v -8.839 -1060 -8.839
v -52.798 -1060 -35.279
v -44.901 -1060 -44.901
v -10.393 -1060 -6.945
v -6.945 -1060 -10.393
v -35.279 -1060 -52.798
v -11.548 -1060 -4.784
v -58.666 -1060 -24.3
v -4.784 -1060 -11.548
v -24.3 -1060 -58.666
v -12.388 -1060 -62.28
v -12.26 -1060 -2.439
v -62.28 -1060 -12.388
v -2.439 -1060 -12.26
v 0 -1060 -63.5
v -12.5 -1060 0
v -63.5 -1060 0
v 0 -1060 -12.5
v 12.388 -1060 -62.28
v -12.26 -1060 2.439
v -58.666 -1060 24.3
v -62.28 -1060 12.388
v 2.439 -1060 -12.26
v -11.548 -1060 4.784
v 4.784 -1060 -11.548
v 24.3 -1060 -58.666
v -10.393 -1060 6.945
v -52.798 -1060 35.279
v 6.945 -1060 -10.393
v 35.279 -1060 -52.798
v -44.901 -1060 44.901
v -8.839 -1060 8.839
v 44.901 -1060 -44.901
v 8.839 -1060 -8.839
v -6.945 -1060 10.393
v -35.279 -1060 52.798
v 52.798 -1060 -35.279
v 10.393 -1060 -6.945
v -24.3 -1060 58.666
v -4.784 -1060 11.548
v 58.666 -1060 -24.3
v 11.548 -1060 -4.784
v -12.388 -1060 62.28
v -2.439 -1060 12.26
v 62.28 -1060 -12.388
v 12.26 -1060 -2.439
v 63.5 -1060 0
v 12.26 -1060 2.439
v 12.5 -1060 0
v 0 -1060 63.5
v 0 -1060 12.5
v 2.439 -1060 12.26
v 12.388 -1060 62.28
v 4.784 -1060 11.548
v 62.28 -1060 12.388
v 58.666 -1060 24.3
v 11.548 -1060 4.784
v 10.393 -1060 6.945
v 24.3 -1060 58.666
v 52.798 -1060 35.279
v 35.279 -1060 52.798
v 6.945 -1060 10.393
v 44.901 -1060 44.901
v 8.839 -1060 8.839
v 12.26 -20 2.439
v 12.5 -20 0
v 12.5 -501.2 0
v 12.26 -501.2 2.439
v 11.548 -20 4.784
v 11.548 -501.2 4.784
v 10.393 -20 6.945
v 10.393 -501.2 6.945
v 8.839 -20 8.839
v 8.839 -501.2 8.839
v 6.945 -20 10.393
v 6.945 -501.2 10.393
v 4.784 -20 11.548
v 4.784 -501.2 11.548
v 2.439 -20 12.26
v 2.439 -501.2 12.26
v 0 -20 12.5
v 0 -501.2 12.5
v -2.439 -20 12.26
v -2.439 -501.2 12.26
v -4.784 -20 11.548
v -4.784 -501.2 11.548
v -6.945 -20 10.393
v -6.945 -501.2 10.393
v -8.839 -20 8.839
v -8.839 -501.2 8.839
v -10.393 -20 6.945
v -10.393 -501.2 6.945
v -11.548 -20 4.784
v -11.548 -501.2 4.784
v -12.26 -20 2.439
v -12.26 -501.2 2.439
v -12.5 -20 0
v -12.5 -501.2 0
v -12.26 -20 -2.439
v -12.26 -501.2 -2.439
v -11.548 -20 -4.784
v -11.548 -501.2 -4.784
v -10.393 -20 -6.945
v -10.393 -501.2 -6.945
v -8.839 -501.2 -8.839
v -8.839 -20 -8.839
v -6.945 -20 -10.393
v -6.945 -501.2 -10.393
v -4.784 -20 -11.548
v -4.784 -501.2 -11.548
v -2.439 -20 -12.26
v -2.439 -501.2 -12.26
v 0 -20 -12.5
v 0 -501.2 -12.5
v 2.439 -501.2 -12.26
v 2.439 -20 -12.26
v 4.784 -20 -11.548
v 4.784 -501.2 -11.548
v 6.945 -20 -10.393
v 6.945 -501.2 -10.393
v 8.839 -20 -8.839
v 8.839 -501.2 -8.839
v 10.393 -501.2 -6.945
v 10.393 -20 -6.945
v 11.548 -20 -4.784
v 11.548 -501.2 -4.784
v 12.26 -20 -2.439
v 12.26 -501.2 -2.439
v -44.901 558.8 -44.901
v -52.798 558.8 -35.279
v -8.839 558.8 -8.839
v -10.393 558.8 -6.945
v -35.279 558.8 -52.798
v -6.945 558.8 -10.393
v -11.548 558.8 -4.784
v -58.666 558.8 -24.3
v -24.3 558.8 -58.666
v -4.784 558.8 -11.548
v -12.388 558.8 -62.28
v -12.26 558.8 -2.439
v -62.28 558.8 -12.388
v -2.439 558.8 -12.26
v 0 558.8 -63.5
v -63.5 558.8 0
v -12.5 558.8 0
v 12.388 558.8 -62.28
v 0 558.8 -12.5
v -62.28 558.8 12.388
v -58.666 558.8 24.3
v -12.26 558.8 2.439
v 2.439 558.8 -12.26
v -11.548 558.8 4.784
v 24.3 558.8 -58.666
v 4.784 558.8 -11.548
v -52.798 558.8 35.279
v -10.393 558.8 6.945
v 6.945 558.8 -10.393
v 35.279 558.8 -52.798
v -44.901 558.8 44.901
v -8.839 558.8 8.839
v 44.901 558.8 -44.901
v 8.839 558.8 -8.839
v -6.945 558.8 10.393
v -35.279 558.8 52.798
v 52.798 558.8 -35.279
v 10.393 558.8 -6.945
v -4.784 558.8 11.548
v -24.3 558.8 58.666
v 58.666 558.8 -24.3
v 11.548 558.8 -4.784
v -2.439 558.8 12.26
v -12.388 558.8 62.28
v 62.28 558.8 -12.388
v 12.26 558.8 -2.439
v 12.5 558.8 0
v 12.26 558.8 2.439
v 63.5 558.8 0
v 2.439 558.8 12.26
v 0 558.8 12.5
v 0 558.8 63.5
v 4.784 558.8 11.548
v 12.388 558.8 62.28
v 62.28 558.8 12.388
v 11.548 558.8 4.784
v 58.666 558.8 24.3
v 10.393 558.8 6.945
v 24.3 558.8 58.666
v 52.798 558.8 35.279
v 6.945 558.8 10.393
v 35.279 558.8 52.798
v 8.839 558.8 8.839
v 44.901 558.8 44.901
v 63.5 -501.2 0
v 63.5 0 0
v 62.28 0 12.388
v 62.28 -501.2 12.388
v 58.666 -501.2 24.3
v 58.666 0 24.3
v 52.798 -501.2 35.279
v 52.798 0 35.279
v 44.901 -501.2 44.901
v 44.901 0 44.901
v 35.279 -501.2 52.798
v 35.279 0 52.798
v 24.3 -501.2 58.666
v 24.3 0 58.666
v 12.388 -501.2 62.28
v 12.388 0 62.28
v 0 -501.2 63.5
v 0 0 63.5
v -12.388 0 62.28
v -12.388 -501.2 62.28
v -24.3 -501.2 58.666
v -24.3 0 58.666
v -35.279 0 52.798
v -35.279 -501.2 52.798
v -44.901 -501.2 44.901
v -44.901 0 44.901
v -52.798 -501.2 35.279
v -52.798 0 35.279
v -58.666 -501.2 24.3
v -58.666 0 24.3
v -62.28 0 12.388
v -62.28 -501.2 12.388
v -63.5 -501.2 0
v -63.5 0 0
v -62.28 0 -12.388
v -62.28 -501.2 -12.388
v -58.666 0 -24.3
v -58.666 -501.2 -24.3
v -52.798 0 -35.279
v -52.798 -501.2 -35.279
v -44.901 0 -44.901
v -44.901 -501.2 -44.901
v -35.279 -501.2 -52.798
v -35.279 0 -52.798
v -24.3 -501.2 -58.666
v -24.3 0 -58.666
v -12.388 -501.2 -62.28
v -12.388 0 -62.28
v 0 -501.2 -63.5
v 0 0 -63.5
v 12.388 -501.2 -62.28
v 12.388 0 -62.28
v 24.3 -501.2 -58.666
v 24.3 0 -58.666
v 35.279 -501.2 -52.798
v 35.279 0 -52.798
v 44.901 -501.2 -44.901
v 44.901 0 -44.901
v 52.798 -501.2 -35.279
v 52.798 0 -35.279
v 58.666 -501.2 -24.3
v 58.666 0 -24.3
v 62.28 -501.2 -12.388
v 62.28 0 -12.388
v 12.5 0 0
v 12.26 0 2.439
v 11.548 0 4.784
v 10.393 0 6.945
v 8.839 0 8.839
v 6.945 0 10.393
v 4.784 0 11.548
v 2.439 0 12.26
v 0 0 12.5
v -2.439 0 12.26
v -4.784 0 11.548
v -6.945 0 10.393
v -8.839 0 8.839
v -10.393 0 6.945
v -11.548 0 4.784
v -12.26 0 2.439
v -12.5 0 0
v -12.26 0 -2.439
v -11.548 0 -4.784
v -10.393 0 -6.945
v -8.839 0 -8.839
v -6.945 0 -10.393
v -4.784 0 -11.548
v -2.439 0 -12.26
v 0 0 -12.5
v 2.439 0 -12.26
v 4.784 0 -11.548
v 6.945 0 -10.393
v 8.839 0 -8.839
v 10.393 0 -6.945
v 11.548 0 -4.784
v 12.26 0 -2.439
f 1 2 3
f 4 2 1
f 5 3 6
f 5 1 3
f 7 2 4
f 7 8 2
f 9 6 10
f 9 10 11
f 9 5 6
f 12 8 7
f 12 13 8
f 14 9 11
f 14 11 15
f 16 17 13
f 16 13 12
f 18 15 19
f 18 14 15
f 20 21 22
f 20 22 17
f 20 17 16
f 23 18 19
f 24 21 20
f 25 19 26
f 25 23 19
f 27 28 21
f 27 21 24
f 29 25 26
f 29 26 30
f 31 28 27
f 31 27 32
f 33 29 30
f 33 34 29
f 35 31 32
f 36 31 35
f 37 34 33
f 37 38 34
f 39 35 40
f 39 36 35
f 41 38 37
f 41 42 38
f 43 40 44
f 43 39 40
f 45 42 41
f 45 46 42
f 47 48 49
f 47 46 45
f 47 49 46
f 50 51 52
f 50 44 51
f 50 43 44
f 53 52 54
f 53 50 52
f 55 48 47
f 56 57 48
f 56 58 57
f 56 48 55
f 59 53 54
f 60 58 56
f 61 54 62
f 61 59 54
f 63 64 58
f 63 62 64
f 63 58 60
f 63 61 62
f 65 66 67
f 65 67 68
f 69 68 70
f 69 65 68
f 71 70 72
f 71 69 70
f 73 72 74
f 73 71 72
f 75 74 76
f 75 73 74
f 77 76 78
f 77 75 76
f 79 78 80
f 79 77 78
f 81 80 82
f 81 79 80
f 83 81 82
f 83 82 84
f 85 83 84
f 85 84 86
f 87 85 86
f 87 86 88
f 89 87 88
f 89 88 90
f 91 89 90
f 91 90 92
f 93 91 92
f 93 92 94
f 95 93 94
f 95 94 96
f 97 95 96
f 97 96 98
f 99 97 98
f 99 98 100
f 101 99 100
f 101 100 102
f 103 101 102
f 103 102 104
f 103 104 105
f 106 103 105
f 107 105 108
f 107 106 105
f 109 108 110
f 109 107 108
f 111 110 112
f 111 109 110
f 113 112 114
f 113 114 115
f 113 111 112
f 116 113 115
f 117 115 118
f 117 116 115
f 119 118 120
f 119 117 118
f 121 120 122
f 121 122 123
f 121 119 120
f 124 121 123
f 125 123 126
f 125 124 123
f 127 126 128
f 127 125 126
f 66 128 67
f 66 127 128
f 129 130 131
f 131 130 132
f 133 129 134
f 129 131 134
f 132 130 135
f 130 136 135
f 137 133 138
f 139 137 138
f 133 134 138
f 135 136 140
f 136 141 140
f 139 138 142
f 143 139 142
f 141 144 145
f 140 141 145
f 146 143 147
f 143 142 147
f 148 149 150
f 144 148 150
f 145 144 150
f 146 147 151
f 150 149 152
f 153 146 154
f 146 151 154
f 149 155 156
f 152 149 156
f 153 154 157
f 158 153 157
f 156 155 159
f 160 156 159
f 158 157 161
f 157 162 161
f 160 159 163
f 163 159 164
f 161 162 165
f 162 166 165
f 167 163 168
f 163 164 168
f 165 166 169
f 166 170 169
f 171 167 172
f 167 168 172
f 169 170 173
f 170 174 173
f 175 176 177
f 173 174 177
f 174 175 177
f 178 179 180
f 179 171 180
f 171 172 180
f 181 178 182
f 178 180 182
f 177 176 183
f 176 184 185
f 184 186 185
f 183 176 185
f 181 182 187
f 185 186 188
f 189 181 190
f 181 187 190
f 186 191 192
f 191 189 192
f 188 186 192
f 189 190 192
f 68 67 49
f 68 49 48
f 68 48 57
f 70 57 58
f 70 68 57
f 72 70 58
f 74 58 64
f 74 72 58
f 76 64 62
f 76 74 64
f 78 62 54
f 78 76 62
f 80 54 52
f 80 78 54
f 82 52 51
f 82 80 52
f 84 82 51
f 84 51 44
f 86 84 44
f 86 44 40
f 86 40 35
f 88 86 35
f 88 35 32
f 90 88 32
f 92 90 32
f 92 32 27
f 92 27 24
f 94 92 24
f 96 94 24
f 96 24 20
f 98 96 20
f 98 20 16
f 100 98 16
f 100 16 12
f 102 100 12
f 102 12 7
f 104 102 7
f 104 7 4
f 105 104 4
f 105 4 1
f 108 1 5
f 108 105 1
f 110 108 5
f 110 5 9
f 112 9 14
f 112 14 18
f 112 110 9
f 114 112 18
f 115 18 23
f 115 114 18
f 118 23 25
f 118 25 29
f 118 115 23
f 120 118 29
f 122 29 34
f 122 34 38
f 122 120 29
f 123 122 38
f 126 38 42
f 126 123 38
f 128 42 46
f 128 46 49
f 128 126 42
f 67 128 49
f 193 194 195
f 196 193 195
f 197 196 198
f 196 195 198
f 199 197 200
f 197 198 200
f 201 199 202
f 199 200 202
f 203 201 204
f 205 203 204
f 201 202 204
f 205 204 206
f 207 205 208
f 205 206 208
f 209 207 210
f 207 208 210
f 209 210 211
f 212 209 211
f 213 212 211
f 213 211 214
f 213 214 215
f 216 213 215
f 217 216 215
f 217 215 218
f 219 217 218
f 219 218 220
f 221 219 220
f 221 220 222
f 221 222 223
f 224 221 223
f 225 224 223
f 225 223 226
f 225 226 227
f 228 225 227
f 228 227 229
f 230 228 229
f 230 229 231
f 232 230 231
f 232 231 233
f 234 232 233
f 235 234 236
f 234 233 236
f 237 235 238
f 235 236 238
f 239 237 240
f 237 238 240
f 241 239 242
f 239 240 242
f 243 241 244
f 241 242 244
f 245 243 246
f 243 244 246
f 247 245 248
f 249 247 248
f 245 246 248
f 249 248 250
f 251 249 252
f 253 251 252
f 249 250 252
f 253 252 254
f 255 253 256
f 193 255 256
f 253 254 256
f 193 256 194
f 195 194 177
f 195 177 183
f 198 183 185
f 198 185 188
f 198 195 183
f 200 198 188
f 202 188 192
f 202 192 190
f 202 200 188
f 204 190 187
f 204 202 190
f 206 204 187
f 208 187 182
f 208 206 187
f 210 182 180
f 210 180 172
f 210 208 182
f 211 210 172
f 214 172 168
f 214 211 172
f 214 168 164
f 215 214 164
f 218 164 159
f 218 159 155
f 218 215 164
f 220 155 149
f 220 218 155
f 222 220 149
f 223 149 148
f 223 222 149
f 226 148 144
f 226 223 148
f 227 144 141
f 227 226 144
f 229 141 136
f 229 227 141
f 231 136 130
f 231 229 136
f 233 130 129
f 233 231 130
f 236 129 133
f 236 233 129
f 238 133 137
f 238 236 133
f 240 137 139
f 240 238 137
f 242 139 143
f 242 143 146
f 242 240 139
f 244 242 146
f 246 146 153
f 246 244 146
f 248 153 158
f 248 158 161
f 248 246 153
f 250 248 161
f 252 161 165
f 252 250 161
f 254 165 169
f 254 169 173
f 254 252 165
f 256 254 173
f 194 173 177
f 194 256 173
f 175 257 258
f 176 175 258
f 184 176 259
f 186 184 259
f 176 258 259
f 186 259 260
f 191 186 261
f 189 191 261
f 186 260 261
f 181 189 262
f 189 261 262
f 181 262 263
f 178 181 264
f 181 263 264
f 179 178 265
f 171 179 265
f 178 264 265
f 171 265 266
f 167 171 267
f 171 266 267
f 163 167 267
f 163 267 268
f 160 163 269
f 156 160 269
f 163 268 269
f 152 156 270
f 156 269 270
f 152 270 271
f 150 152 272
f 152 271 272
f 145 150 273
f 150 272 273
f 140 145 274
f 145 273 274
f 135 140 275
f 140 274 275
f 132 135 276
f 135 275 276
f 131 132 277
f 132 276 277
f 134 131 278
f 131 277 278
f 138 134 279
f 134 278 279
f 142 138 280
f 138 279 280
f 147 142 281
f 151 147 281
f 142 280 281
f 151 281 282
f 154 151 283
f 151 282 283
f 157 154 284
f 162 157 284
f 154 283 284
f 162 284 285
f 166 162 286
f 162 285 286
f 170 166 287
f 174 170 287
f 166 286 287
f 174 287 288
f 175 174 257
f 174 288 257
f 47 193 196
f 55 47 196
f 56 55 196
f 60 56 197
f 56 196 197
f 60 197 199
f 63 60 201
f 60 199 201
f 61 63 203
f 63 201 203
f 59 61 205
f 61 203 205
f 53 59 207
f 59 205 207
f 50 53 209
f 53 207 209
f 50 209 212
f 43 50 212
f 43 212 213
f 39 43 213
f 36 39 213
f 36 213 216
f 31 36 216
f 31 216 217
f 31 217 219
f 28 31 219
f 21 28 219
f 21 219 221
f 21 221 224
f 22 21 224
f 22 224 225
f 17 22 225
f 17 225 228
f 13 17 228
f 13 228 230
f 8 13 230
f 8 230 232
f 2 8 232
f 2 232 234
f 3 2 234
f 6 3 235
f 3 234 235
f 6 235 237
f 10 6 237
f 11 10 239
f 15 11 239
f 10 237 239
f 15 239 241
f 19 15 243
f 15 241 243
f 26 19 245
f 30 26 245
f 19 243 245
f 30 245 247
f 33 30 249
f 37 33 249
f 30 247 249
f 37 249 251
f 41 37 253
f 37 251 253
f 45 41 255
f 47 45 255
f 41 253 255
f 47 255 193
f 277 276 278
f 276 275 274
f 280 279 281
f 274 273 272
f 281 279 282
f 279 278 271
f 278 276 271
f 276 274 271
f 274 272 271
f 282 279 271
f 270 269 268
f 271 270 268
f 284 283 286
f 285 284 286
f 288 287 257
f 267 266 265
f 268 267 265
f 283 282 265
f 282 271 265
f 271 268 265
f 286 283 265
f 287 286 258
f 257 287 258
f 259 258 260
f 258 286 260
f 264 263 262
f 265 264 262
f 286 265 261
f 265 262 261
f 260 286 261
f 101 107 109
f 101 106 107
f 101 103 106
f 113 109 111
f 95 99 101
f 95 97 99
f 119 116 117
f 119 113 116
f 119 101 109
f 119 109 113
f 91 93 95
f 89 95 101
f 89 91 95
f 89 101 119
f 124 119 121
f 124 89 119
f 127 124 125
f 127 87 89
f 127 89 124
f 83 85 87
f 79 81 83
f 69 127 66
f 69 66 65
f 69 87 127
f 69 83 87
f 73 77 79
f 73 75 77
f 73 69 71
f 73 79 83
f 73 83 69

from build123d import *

# Parameters (mm, degrees)
F0_R        = 63.5
F0_R_2      = 12.5
F1_DEPTH    = 20
F2_DEPTH    = 1060
F2_FACE_R   = 63.5
F2_FACE_R_2 = 12.5
F3_DEPTH    = 558.8


with BuildPart() as f1:
    # F0 (on Front) → F1 (new body)
    with BuildSketch(Plane.XZ):
        Circle(F0_R)
        Circle(F0_R_2, mode=Mode.SUBTRACT)
        Circle(F0_R_2)
    extrude(amount=F1_DEPTH)

    # F0 (on Front) → F2 (join)
    with BuildSketch(Plane.XZ):
        Circle(F0_R)
        Circle(F0_R_2, mode=Mode.SUBTRACT)
    extrude(amount=F2_DEPTH)

    # F0 (on Front) + F2_face (on face) → F3 (join)
    with BuildSketch(Plane.XZ):
        Circle(F0_R)
        Circle(F0_R_2, mode=Mode.SUBTRACT)
    with BuildSketch(Plane.XZ.offset(1060)):
        Circle(F2_FACE_R)
        Circle(F2_FACE_R_2, mode=Mode.SUBTRACT)
    extrude(amount=-F3_DEPTH)


solid = f1.part
